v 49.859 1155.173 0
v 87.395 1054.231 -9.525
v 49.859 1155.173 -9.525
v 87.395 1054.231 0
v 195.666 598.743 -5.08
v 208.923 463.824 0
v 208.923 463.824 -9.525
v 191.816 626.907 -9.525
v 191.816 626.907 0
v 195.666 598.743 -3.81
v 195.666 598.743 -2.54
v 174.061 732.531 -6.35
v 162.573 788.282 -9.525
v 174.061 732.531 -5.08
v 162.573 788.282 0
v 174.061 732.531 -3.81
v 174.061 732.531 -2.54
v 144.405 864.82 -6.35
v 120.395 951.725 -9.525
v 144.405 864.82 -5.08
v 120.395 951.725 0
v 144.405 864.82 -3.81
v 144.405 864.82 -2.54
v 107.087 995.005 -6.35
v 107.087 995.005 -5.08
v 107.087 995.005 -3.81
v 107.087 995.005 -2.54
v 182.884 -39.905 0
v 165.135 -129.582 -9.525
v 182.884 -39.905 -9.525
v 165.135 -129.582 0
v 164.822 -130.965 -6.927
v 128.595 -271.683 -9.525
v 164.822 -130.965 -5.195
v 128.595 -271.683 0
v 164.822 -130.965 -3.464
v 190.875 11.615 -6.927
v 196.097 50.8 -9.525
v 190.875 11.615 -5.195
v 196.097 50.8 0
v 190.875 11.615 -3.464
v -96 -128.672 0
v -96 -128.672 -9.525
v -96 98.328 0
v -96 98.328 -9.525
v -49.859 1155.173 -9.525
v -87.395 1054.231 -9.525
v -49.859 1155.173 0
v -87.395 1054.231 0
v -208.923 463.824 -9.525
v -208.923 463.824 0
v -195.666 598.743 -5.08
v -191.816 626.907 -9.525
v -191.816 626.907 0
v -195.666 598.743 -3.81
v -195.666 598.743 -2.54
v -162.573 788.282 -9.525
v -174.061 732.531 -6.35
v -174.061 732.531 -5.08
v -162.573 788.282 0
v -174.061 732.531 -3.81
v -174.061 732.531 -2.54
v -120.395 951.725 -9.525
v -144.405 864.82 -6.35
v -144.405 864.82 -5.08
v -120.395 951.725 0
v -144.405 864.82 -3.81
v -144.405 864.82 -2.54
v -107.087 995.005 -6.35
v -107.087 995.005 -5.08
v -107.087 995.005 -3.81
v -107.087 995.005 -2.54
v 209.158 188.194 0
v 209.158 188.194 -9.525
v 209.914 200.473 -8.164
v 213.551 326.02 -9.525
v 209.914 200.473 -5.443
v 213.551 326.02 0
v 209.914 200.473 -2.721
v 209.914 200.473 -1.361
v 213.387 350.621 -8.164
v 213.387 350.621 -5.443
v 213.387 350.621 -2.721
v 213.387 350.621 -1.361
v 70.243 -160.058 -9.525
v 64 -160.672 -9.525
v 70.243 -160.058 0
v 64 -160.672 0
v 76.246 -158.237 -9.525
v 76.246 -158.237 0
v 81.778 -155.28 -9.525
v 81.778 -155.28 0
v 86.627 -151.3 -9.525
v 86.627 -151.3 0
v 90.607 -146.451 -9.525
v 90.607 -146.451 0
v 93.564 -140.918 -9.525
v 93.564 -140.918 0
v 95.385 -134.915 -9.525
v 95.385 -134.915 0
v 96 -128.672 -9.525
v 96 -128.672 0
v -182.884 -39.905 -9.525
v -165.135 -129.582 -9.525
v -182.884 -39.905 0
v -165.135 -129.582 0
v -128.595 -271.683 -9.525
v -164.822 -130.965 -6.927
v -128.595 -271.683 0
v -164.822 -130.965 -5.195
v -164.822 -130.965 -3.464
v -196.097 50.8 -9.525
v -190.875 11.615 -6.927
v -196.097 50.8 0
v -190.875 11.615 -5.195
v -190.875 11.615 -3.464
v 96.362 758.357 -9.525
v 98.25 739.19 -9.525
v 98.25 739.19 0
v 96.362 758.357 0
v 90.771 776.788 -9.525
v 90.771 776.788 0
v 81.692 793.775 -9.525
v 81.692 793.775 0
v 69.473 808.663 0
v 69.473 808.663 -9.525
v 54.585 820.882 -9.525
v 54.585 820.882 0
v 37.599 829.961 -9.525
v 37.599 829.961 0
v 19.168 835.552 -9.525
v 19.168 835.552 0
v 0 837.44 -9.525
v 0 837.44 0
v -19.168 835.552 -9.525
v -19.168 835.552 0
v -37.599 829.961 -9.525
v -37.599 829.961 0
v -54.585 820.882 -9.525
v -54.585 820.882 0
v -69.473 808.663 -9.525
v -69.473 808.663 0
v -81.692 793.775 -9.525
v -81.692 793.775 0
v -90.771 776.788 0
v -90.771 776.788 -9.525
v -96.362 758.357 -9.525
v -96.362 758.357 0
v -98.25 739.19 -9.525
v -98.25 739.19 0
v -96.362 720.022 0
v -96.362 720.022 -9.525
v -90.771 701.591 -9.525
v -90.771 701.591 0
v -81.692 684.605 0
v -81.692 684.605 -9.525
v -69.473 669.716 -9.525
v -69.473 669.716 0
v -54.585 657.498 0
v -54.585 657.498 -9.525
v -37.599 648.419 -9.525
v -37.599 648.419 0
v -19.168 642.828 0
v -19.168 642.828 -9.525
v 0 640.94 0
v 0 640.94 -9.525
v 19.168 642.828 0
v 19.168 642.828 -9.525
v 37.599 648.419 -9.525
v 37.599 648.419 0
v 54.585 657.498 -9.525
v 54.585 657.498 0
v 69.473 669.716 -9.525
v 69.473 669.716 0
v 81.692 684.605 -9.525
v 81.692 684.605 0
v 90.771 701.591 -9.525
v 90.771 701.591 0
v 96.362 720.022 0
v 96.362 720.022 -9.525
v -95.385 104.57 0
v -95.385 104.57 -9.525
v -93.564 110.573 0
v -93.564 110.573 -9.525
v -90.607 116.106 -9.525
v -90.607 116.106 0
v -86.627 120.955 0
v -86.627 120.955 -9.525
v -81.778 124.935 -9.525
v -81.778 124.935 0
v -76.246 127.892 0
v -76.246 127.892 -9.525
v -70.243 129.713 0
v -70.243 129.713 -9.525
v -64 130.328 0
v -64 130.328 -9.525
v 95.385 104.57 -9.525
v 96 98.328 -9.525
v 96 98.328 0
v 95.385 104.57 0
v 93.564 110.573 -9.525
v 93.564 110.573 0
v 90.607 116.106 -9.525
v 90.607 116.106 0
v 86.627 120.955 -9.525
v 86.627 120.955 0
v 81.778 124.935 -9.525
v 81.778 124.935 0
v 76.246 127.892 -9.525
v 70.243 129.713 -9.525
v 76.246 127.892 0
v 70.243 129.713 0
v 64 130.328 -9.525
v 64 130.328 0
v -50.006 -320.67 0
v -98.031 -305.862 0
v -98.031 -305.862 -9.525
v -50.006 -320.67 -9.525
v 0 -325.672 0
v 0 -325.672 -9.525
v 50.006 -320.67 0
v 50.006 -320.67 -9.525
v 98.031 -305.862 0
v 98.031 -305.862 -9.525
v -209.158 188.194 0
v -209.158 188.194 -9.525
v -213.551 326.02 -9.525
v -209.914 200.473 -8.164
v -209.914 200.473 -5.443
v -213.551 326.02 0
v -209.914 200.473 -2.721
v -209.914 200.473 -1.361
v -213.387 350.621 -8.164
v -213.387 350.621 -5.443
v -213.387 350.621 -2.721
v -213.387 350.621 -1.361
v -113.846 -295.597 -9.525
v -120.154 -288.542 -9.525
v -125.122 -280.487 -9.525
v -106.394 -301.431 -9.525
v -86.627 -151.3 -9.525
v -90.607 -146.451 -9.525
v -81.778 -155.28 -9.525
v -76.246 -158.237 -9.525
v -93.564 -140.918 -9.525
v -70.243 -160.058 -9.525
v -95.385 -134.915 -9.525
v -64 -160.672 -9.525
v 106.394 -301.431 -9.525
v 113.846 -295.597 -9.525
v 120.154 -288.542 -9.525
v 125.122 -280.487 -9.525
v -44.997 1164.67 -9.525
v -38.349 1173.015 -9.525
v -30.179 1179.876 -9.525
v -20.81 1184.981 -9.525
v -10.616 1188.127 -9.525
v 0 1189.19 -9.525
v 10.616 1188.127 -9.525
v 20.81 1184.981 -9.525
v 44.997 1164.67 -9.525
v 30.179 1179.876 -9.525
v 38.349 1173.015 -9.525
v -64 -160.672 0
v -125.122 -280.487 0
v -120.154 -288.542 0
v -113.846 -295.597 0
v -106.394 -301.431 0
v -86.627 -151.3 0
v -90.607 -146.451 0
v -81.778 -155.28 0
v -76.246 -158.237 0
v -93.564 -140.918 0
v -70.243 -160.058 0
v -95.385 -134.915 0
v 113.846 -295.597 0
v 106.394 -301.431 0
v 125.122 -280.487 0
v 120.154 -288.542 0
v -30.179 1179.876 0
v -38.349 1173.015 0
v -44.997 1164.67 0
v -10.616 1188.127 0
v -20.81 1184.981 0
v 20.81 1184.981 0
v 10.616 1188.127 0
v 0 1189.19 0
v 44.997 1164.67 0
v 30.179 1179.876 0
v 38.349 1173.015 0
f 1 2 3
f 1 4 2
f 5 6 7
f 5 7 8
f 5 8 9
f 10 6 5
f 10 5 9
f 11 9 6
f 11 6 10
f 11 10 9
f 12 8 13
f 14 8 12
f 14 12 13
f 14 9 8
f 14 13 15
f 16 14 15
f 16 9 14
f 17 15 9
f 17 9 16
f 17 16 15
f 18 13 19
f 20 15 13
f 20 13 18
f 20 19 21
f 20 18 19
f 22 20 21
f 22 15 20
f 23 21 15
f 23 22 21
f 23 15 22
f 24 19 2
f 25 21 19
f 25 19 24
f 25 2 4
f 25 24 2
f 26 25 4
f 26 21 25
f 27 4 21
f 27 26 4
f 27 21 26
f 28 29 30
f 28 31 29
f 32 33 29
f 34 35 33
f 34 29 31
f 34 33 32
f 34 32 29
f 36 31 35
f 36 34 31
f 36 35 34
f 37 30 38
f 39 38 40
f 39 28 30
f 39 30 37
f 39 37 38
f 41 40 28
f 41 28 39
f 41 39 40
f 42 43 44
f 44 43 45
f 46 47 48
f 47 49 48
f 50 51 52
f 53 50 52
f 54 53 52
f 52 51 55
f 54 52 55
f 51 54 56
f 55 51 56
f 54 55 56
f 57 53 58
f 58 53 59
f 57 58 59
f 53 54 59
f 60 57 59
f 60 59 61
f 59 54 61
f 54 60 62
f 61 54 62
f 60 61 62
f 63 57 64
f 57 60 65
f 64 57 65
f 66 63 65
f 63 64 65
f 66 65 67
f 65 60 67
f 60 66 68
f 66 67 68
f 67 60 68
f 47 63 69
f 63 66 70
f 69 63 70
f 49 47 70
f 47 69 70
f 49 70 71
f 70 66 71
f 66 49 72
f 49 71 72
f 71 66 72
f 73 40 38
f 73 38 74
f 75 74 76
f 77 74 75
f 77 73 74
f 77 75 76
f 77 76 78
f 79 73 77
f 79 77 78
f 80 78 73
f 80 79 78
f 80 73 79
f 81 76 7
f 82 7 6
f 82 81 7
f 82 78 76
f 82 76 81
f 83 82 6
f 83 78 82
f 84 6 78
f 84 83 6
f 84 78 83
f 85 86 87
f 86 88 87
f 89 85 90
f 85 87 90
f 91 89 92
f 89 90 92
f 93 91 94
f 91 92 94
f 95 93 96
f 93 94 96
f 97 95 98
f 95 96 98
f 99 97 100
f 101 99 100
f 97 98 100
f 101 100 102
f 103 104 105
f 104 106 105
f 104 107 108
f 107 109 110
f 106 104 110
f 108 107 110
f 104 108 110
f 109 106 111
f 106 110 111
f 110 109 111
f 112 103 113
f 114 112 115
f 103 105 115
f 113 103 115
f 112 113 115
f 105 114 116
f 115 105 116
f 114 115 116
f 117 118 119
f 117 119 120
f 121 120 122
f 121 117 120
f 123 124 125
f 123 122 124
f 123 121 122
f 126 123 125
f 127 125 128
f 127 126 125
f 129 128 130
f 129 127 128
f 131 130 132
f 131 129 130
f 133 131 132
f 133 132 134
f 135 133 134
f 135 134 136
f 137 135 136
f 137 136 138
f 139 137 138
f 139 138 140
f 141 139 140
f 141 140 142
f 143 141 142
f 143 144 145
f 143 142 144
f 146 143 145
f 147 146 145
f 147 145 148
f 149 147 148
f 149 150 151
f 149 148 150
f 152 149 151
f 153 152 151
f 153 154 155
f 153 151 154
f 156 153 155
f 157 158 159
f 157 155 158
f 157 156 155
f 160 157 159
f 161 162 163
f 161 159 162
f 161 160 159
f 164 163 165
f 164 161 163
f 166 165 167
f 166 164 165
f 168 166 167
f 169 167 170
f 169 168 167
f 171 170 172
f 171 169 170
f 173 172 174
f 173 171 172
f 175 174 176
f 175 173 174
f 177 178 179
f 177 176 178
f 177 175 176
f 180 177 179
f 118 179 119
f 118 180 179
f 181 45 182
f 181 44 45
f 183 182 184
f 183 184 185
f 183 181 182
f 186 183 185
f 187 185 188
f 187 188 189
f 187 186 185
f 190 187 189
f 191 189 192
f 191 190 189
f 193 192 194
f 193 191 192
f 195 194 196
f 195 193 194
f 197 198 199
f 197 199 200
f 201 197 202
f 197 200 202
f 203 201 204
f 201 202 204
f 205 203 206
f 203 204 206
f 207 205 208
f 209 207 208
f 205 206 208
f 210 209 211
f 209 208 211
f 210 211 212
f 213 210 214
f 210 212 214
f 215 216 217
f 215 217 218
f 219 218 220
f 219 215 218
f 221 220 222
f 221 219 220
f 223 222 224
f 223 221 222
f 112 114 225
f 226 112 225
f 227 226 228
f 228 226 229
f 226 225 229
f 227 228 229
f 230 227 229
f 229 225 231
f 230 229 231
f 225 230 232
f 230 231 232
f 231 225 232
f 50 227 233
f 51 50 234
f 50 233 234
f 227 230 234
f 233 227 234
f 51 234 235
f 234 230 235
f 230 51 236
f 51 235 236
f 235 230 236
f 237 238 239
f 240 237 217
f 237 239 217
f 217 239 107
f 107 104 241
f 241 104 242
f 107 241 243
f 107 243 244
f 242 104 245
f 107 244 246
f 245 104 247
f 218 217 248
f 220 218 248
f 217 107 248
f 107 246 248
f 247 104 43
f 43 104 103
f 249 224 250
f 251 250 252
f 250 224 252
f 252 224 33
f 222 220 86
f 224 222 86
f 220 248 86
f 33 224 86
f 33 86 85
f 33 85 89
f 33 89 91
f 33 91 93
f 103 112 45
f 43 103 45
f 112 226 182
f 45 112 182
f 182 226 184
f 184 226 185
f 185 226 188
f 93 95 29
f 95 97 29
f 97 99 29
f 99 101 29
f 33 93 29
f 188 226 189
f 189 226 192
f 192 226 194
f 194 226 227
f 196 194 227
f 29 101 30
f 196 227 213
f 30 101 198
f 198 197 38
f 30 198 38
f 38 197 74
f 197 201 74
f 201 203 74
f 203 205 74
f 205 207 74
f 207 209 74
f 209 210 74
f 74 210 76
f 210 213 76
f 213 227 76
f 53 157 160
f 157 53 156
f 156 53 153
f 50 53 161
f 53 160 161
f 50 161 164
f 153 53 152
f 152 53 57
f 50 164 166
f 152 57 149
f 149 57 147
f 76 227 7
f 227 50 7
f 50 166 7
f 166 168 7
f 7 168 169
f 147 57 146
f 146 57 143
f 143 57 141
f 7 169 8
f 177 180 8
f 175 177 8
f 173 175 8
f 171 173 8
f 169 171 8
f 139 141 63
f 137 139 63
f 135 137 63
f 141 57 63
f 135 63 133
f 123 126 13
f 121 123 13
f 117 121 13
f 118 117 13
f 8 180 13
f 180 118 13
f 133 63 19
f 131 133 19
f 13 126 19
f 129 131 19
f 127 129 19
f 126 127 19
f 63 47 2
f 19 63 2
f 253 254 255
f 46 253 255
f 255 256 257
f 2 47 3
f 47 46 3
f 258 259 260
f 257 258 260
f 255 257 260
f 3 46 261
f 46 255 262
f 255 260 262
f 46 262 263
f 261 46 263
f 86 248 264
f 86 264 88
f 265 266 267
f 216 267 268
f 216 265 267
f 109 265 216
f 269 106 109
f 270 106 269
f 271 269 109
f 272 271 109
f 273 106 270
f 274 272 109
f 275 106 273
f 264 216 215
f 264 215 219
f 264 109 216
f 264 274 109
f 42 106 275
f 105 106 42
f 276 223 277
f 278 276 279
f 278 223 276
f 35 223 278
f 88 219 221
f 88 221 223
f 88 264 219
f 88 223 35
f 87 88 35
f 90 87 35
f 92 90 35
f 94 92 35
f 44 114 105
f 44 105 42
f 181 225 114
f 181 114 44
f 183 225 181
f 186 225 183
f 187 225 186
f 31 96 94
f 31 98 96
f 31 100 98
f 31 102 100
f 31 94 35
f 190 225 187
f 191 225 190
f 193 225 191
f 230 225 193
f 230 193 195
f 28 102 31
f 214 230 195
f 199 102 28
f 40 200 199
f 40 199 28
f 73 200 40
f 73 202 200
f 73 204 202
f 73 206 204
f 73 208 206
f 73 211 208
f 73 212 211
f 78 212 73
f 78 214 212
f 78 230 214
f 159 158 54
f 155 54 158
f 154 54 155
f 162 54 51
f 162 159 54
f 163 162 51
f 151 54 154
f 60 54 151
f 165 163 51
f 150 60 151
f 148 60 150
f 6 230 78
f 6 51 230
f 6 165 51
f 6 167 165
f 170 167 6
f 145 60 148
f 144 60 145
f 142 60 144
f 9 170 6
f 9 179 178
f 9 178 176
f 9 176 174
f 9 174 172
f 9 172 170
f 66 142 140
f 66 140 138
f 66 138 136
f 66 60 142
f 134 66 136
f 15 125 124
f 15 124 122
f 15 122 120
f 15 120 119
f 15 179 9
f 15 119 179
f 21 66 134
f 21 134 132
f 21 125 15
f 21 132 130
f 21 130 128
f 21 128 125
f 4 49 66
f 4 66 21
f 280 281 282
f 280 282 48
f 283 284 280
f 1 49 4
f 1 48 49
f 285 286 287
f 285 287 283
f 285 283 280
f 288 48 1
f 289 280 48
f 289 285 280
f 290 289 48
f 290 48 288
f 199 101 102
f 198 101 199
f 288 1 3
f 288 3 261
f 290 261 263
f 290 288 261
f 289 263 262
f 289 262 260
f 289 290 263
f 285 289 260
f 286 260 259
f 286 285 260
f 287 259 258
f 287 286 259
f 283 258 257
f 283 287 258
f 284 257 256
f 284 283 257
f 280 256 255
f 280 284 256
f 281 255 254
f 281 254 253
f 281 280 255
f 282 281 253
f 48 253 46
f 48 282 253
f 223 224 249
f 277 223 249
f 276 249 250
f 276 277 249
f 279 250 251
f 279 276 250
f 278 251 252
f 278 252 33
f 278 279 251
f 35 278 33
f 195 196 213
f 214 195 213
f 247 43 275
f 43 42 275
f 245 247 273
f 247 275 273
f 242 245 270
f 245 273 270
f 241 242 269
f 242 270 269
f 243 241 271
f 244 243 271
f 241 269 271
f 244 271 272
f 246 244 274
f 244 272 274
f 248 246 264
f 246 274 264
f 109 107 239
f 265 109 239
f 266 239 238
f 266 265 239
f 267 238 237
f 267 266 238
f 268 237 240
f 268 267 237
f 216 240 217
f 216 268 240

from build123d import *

# Parameters (mm, degrees)
BOSS_EXTRUDE2_DEPTH     = 9.525
CUT_EXTRUDE2_DEPTH      = 20
CUT_EXTRUDE2_DEPTH_BACK = 20
SKETCH5_R               = 98.25
SKETCH5_W               = 192
SKETCH5_H               = 291
FILLET1_R               = 32


with BuildPart() as part:
    # Sketch3 → Boss-Extrude2 (new body)
    with BuildSketch(Plane.XY):
        with BuildLine():
            ThreePointArc((-128.594557171, -271.683003432), (-117.156149866, -292.20930741), (-98.031335876, -305.862431833))
            ThreePointArc((-98.031335876, -305.862431833), (0, -325.672487157), (98.031335876, -305.862431833))
            ThreePointArc((98.031335876, -305.862431833), (117.156149866, -292.20930741), (128.594557171, -271.683003432))
            add(Edge.make_bspline(
                [(128.594557171, -271.683003432), (128.929001137, -270.550670561), (129.607009929, -268.248148567), (132.92675238, -256.894775015), (138.372363082, -237.609630026), (145.587498555, -210.232026724), (152.54164904, -182.662401273), (159.273671104, -155.04724849), (165.68462346, -127.4627227), (173.662799668, -90.634906462), (182.437600317, -44.41870561), (190.23386569, 5.92326819), (194.466912187, 37.721145483), (196.09738159, 50.8)],
                knots=[0.178448909, 0.178448909, 0.178448909, 0.178448909, 0.182331107, 0.186345522, 0.217403108, 0.248460695, 0.279518282, 0.310575869, 0.341633456, 0.372691043, 0.434806217, 0.496921391, 0.540232629, 0.540232629, 0.540232629, 0.540232629], degree=3))
            add(Edge.make_bspline(
                [(196.09738159, 50.8), (196.805263519, 56.478294089), (199.763447664, 80.926441622), (204.336033541, 124.225867737), (208.913068108, 180.752800745), (213.041680781, 256.162202935), (214.132905766, 331.756352431), (212.168857378, 407.250169642), (210.17648868, 444.979630563), (208.923145523, 463.823648231)],
                knots=[0.540232629, 0.540232629, 0.540232629, 0.540232629, 0.559036565, 0.621151739, 0.683266912, 0.745382086, 0.869612434, 0.931727608, 0.993842782, 0.993842782, 0.993842782, 0.993842782], degree=3))
            add(Edge.make_bspline(
                [(208.923145523, 463.823648231), (207.922427582, 478.869564138), (205.602175882, 508.953742276), (199.706639723, 568.910060357), (189.991147, 643.543237919), (177.216824309, 717.777671868), (165.195396161, 776.883168245), (152.011482075, 835.667387937), (133.349255404, 908.643148932), (111.913437805, 980.768947108), (93.147501113, 1037.903472604), (78.26260519, 1080.480419865), (66.491586651, 1112.150932405), (58.40099204, 1133.20563378), (54.364426792, 1143.620772929), (51.51701688, 1150.938010972), (50.030240387, 1154.735608428), (49.858718612, 1155.173455571)],
                knots=[0, 0, 0, 0, 0.062482564, 0.124965127, 0.249930255, 0.374895382, 0.437377946, 0.499860509, 0.624825636, 0.749790764, 0.812273327, 0.874755891, 0.937238455, 0.952859096, 0.968479737, 0.983464396, 0.985416976, 0.985416976, 0.985416976, 0.985416976], degree=3))
            ThreePointArc((49.858718612, 1155.173455571), (0, 1189.189732385), (-49.858718612, 1155.173455571))
            add(Edge.make_bspline(
                [(-208.923145523, 463.823648231), (-207.922427582, 478.869564138), (-205.602175882, 508.953742276), (-199.706639723, 568.910060357), (-189.991147, 643.543237919), (-177.216824309, 717.777671868), (-165.195396161, 776.883168245), (-152.011482075, 835.667387937), (-133.349255404, 908.643148932), (-111.913437805, 980.768947108), (-93.147501113, 1037.903472604), (-78.26260519, 1080.480419865), (-66.491586651, 1112.150932405), (-58.40099204, 1133.20563378), (-54.364426792, 1143.620772929), (-51.51701688, 1150.938010972), (-50.030240387, 1154.735608428), (-49.858718612, 1155.173455571)],
                knots=[0, 0, 0, 0, 0.062482564, 0.124965127, 0.249930255, 0.374895382, 0.437377946, 0.499860509, 0.624825636, 0.749790764, 0.812273327, 0.874755891, 0.937238455, 0.952859096, 0.968479737, 0.983464396, 0.985416976, 0.985416976, 0.985416976, 0.985416976], degree=3))
            add(Edge.make_bspline(
                [(-196.09738159, 50.8), (-196.805263519, 56.478294089), (-199.763447664, 80.926441622), (-204.336033541, 124.225867737), (-208.913068108, 180.752800745), (-213.041680781, 256.162202935), (-214.132905766, 331.756352431), (-212.168857378, 407.250169642), (-210.17648868, 444.979630563), (-208.923145523, 463.823648231)],
                knots=[0.540232629, 0.540232629, 0.540232629, 0.540232629, 0.559036565, 0.621151739, 0.683266912, 0.745382086, 0.869612434, 0.931727608, 0.993842782, 0.993842782, 0.993842782, 0.993842782], degree=3))
            add(Edge.make_bspline(
                [(-128.594557171, -271.683003432), (-128.929001137, -270.550670561), (-129.607009929, -268.248148567), (-132.92675238, -256.894775015), (-138.372363082, -237.609630026), (-145.587498555, -210.232026724), (-152.54164904, -182.662401273), (-159.273671104, -155.04724849), (-165.68462346, -127.4627227), (-173.662799668, -90.634906462), (-182.437600317, -44.41870561), (-190.23386569, 5.92326819), (-194.466912187, 37.721145483), (-196.09738159, 50.8)],
                knots=[0.178448909, 0.178448909, 0.178448909, 0.178448909, 0.182331107, 0.186345522, 0.217403108, 0.248460695, 0.279518282, 0.310575869, 0.341633456, 0.372691043, 0.434806217, 0.496921391, 0.540232629, 0.540232629, 0.540232629, 0.540232629], degree=3))
        make_face()
    extrude(amount=-BOSS_EXTRUDE2_DEPTH)

    # Sketch5 → Cut-Extrude2 (cut, two sides: drawn at the far end of the back side and taken through both)
    with BuildSketch(Plane.XY.offset(-CUT_EXTRUDE2_DEPTH_BACK)):
        with Locations((0, 739.189732385)):
            Circle(SKETCH5_R)
        with Locations((0, -15.172487157)):
            Rectangle(SKETCH5_W, SKETCH5_H)
    extrude(amount=CUT_EXTRUDE2_DEPTH + CUT_EXTRUDE2_DEPTH_BACK, mode=Mode.SUBTRACT)

    # Fillet1
    fillet1_edges = [part.edges().sort_by_distance(p)[0] for p in [
        (-96, -160.672487157, -4.7625),
        (96, -160.672487157, -4.7625),
        (96, 130.327512843, -4.7625),
        (-96, 130.327512843, -4.7625),
    ]]
    fillet(fillet1_edges, radius=FILLET1_R)


solid = part.part
